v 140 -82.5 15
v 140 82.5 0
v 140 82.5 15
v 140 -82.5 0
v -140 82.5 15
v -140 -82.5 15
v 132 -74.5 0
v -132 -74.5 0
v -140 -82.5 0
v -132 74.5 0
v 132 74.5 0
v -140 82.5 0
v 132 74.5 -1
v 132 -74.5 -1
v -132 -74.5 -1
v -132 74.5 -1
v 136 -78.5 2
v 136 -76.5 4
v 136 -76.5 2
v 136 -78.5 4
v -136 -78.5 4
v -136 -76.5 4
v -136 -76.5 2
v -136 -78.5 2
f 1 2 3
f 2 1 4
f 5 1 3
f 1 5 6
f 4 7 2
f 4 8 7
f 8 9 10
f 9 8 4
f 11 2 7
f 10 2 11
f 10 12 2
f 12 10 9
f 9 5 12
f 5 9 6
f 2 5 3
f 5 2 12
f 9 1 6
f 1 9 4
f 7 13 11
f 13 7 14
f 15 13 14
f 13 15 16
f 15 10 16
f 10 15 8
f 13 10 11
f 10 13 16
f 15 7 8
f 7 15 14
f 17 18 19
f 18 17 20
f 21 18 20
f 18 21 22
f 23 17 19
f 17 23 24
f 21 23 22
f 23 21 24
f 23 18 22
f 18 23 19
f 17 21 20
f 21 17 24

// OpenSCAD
lid_w=280; lid_d=165; lid_t=15; lip=8; groove_w=2; groove_d=2;
module lid(){ translate([-lid_w/2,-lid_d/2,0]) cube([lid_w,lid_d,lid_t]); translate([-lid_w/2+8,-lid_d/2+8,-1]) cube([lid_w-16,lid_d-16,lid_t-10]); }
difference(){ lid(); translate([-lid_w/2+4,-lid_d/2+4,2]) cube([lid_w-8,groove_w,groove_d]); }
